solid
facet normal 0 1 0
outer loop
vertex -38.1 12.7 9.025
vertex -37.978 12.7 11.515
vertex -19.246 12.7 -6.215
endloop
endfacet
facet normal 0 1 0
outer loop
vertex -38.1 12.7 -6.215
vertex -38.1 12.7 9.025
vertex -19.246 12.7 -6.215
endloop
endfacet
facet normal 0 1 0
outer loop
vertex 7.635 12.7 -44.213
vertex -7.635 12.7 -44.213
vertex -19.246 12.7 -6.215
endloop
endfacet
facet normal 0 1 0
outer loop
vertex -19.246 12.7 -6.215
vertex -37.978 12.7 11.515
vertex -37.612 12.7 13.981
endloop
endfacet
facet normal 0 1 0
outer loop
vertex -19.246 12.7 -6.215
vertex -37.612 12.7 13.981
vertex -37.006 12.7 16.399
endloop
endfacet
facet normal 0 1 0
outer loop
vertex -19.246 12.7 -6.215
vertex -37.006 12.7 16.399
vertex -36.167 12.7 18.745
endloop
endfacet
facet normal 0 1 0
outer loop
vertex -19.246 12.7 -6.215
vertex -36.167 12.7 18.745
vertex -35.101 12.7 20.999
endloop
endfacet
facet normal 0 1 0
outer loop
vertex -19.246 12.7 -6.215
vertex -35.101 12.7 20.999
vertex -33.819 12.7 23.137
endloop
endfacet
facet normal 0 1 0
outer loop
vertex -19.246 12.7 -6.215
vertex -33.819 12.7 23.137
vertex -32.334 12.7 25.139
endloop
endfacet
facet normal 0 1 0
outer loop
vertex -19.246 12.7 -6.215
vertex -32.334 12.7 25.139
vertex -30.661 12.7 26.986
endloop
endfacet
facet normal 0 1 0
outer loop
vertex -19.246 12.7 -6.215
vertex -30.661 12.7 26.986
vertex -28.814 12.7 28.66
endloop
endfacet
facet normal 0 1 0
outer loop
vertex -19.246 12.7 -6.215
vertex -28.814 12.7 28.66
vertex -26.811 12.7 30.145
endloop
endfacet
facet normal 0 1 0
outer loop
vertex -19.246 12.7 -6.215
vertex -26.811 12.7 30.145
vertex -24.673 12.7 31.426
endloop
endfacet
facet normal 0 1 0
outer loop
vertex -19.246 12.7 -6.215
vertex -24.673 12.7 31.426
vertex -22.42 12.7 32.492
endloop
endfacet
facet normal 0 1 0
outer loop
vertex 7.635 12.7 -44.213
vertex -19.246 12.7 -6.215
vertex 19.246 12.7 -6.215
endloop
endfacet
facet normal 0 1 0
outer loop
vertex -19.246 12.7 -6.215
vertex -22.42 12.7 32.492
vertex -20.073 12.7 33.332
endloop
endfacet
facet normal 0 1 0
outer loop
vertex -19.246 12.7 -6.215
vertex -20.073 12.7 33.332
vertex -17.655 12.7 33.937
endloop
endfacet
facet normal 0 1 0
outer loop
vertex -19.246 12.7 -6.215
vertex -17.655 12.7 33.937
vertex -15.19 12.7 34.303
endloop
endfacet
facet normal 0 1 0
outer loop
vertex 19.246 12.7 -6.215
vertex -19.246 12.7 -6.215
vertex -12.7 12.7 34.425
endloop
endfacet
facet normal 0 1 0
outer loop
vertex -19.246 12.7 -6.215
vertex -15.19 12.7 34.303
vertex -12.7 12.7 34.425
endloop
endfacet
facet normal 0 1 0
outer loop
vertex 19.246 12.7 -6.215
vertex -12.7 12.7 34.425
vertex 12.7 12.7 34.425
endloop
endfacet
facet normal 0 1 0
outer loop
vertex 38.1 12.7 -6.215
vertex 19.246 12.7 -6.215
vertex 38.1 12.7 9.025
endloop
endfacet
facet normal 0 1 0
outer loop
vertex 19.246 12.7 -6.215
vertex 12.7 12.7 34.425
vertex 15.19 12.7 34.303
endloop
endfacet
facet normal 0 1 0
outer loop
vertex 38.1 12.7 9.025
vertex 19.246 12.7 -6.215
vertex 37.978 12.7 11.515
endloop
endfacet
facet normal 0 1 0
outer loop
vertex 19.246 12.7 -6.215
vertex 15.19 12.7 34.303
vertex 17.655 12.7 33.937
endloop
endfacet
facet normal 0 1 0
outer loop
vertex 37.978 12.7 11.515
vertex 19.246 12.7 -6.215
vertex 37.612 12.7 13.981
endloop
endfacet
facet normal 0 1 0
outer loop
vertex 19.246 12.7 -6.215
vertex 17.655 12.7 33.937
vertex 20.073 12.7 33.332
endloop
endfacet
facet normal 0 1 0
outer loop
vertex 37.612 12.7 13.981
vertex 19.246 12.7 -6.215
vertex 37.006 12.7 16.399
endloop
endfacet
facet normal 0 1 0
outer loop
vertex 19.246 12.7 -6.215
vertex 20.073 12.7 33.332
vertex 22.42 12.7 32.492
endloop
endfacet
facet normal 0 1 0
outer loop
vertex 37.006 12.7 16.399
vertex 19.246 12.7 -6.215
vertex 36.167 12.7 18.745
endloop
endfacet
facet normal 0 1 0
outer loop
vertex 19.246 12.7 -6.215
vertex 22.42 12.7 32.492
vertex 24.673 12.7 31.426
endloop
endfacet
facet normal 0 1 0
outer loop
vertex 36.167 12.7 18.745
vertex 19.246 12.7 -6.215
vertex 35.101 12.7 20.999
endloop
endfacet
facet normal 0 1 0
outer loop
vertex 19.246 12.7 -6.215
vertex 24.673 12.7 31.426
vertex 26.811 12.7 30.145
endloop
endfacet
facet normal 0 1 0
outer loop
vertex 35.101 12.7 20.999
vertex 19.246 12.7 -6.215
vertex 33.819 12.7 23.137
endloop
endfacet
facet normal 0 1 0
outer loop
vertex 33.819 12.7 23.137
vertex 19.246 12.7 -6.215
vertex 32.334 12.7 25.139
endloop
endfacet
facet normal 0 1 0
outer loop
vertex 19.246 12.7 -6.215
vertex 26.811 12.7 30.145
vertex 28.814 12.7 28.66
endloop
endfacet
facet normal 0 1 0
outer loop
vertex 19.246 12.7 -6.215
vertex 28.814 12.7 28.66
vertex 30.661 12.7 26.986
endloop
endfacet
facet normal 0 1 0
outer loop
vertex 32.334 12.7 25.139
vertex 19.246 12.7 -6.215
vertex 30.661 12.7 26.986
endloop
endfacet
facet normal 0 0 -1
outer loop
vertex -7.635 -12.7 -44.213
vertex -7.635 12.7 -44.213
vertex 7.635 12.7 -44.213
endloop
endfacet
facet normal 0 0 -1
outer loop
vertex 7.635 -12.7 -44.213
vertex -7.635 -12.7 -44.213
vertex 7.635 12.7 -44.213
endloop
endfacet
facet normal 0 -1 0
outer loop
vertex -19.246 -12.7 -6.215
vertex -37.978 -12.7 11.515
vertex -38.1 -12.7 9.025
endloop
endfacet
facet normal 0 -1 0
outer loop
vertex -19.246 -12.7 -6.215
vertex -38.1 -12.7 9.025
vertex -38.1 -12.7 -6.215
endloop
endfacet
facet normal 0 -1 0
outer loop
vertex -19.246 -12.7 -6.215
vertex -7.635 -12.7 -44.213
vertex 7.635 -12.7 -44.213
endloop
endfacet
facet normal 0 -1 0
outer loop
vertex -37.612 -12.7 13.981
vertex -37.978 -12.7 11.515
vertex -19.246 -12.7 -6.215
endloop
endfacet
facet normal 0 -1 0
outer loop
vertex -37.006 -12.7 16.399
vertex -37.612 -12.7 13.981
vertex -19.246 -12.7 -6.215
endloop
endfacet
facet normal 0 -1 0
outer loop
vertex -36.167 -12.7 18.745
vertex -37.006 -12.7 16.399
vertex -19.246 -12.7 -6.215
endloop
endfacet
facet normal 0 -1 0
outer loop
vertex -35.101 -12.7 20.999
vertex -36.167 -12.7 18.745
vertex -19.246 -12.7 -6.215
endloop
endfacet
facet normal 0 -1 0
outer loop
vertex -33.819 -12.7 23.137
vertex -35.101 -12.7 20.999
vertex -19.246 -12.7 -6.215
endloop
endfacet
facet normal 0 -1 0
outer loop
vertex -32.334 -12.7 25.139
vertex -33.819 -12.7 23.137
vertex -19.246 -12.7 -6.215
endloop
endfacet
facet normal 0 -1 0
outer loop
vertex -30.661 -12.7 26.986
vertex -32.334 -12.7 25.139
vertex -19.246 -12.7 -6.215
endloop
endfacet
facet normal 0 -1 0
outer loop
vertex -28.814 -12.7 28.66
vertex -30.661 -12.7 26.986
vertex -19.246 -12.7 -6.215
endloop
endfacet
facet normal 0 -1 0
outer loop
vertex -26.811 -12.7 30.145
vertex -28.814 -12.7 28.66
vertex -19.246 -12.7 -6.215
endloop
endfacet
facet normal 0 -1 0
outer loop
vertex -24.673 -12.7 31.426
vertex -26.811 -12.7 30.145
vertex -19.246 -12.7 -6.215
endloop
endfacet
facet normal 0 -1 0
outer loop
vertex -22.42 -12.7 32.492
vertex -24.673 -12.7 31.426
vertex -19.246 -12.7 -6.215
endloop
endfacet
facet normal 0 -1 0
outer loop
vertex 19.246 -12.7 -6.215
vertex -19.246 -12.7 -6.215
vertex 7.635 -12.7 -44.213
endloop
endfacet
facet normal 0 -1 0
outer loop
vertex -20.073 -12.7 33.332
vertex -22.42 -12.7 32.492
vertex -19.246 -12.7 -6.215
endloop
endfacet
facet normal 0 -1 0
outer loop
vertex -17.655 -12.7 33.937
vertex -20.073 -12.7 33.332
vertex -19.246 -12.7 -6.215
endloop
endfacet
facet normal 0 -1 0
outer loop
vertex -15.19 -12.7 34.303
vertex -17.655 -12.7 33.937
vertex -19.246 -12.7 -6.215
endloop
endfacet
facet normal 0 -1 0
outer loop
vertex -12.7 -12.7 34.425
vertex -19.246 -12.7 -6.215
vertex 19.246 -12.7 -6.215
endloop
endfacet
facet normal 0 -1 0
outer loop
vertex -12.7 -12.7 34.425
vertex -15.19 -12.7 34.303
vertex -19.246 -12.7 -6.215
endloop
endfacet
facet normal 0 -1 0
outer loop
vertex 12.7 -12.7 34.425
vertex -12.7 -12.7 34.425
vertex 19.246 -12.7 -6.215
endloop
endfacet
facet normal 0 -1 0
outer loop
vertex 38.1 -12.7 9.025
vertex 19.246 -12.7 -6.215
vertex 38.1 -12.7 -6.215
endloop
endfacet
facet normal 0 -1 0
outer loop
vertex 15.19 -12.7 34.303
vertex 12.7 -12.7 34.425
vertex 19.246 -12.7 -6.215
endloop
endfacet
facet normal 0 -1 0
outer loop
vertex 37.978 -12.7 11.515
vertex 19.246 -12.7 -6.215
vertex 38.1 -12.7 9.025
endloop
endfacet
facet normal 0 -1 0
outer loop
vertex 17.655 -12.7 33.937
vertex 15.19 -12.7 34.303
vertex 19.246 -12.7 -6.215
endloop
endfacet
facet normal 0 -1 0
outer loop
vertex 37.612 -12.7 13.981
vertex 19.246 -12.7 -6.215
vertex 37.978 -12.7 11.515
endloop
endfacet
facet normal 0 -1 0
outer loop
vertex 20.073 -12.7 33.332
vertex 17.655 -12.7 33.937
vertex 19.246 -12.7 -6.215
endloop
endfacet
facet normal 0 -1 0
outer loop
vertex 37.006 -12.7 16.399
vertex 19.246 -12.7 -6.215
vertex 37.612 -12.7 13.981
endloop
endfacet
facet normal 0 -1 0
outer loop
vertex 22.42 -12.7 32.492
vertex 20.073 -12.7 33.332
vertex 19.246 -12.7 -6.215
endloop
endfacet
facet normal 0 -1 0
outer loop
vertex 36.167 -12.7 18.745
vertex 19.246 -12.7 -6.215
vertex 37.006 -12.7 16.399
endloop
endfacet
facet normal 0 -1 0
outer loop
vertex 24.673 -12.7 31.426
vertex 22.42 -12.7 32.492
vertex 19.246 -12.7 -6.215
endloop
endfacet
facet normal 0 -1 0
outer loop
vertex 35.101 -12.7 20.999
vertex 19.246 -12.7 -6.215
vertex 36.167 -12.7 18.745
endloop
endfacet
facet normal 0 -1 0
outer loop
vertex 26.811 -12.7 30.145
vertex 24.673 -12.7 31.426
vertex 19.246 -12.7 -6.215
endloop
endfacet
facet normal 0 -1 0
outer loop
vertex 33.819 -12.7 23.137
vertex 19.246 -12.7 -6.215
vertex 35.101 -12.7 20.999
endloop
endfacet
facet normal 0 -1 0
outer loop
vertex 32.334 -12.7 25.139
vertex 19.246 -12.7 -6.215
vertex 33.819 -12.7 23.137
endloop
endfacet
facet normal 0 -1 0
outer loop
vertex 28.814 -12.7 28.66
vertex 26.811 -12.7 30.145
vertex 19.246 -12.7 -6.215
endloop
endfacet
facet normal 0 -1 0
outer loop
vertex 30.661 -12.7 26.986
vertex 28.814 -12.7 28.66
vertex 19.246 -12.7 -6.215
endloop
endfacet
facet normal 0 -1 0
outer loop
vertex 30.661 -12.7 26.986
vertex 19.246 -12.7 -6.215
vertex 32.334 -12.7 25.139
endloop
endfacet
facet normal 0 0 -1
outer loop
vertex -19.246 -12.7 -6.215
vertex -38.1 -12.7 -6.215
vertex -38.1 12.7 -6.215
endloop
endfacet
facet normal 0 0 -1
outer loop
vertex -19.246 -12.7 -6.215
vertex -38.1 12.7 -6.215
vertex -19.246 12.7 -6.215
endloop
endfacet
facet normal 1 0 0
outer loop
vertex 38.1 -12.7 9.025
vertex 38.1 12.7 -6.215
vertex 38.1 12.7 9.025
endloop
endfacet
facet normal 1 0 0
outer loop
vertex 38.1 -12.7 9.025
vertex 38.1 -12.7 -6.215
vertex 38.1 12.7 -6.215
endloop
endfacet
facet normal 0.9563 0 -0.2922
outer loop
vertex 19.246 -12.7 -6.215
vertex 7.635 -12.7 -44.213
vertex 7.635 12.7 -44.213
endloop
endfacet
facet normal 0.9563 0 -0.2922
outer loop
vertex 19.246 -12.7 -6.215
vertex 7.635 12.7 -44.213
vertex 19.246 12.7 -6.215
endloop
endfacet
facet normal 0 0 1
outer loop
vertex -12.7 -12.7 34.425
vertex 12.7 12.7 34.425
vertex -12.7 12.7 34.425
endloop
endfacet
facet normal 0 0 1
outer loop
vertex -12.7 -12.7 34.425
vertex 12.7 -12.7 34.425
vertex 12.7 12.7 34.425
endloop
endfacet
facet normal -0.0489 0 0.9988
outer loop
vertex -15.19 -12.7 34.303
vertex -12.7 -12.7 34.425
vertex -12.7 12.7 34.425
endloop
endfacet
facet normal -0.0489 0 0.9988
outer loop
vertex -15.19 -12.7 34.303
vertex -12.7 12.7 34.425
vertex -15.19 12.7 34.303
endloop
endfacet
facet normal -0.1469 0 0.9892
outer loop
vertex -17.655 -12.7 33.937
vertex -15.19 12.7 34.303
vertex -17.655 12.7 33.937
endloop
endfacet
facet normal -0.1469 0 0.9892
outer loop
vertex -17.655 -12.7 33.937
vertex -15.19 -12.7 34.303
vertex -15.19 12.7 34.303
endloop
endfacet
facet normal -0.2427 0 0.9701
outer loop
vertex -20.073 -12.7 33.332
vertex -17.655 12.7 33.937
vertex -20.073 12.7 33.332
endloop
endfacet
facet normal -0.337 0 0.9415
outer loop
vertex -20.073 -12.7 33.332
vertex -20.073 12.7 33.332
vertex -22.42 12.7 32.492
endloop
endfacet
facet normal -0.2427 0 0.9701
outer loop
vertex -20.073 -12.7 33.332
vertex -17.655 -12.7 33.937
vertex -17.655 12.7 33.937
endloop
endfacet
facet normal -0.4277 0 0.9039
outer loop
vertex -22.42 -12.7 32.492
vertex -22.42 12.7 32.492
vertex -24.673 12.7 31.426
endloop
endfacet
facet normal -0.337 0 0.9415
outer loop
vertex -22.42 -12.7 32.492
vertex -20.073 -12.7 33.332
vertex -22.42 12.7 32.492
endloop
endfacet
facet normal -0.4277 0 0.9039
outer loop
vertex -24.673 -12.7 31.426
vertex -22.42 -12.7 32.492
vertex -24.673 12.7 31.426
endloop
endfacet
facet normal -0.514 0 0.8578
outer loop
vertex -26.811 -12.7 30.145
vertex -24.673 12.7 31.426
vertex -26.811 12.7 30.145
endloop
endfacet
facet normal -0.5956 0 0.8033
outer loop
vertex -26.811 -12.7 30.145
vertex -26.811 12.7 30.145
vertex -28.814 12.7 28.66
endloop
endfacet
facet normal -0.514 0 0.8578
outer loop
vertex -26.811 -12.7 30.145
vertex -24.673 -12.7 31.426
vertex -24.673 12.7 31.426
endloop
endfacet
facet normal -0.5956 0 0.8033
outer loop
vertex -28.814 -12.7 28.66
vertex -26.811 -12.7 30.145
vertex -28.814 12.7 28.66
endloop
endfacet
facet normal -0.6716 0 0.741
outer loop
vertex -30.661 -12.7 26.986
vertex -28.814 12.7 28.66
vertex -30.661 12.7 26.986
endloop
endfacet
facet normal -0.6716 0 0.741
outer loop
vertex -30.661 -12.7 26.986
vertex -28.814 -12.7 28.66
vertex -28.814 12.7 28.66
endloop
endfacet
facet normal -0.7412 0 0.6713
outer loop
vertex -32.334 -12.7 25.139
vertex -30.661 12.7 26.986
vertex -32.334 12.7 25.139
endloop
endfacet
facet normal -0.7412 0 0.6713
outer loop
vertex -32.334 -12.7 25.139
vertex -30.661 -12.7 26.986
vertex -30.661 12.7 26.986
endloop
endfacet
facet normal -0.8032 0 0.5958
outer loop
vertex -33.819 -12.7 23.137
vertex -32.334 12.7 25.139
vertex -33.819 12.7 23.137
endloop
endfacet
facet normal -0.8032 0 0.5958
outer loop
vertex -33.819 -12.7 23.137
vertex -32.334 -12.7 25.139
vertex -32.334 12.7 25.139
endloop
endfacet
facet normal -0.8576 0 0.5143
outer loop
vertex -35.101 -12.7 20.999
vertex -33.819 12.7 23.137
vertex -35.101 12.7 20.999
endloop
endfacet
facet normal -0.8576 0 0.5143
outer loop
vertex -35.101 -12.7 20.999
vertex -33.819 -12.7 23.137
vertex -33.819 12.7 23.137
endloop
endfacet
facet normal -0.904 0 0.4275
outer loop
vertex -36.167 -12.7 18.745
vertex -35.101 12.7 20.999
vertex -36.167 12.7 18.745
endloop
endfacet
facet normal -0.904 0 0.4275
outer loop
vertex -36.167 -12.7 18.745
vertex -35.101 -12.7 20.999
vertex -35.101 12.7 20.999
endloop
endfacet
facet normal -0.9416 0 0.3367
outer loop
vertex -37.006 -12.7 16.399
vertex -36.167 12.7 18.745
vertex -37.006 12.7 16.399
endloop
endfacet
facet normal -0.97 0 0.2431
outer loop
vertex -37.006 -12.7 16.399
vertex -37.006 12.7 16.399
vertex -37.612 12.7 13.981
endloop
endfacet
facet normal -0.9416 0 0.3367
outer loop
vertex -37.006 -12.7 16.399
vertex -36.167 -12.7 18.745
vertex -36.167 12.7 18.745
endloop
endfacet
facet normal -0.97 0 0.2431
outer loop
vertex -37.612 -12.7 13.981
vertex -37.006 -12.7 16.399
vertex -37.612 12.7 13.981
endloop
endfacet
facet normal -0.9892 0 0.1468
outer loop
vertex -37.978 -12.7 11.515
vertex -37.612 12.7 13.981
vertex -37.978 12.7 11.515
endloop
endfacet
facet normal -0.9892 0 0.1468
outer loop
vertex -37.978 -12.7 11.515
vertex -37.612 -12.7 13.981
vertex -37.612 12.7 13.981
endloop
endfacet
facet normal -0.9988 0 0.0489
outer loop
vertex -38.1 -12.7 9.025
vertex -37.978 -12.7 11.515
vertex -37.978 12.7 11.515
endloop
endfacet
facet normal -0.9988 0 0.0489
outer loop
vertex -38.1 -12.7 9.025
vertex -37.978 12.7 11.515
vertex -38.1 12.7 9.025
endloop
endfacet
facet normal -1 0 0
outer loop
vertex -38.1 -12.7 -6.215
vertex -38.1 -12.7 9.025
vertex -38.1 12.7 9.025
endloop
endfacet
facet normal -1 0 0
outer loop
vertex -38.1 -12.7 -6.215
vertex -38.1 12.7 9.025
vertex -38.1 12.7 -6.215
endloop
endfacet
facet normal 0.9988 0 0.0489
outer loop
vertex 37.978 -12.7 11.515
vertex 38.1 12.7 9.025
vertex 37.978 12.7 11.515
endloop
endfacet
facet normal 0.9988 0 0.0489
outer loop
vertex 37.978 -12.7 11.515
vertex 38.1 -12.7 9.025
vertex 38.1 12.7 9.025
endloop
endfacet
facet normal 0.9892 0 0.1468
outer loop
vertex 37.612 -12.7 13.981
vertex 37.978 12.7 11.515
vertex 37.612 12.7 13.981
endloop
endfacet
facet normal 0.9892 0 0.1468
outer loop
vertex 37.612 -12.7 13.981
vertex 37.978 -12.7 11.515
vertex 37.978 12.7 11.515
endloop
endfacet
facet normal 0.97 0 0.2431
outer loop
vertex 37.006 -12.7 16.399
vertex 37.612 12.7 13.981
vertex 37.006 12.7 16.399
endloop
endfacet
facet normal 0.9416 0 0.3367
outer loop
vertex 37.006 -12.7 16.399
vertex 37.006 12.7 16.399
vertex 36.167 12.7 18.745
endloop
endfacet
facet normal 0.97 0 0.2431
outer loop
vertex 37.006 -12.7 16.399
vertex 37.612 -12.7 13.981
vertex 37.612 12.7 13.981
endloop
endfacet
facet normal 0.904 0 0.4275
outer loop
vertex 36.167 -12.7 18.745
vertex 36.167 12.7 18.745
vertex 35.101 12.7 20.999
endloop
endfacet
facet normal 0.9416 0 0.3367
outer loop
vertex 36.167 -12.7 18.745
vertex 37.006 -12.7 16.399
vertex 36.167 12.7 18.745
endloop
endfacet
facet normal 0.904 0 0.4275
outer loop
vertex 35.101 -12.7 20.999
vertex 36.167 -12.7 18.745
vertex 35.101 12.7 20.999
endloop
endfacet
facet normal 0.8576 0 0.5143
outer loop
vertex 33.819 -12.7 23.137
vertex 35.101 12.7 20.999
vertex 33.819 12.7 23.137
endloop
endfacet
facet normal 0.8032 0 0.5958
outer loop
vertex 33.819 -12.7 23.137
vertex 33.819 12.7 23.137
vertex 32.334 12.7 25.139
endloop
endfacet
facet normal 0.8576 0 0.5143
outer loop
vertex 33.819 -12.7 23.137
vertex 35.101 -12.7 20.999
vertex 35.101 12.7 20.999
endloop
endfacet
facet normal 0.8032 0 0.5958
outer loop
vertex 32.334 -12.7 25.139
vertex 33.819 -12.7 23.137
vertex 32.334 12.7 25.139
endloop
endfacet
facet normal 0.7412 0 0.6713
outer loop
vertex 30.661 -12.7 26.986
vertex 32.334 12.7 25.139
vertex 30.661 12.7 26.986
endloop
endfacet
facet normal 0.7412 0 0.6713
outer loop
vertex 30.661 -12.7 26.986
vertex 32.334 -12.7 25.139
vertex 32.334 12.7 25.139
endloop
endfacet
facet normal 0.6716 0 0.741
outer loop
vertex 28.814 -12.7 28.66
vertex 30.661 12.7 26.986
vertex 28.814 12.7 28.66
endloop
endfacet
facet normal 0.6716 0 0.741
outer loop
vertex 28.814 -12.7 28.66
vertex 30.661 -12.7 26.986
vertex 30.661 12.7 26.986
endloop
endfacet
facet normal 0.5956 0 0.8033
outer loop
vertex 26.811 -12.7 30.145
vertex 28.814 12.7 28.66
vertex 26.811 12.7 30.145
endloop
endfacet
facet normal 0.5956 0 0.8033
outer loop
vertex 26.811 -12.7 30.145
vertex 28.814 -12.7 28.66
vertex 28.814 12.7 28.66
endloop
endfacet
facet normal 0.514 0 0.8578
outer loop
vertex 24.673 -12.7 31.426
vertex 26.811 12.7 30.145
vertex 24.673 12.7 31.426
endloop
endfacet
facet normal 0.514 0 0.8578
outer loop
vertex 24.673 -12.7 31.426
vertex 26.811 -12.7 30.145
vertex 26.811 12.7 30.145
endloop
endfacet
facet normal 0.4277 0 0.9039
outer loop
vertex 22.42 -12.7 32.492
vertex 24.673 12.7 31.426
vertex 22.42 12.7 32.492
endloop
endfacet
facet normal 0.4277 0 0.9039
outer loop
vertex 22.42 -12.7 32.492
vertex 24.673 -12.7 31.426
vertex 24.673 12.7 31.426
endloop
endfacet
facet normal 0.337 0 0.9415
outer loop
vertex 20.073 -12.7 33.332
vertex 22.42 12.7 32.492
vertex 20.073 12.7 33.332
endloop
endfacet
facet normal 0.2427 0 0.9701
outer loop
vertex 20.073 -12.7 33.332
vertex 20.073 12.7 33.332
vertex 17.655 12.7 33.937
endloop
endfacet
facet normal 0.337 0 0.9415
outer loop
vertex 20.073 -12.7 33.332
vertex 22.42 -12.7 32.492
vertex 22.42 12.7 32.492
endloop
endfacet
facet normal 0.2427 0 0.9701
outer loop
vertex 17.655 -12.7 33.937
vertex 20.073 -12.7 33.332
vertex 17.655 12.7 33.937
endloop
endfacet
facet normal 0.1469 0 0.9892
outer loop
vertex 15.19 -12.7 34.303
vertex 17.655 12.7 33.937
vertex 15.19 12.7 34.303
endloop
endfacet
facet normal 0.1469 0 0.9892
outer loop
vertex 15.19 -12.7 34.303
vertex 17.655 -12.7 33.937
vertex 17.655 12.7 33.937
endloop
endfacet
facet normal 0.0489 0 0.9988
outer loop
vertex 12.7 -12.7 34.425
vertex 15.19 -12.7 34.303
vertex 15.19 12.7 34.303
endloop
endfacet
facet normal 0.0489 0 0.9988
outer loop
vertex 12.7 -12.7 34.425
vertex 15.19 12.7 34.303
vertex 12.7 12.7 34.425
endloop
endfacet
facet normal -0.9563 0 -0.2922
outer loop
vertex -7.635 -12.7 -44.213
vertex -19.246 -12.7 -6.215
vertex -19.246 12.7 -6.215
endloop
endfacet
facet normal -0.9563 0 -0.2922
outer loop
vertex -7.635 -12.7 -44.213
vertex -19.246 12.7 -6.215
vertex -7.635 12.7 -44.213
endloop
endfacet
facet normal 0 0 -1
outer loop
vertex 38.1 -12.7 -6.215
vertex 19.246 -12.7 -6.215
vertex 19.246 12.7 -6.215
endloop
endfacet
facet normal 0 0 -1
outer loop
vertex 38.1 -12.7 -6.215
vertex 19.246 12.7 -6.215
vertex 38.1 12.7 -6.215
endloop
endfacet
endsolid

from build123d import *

# Parameters (mm, degrees)
F1_DEPTH      = 12.7
F1_DEPTH_BACK = 12.7


with BuildPart() as f1:
    # F0 (on Front) → F1 (new body, two sides)
    with BuildSketch(Plane.XZ) as f1_sk:
        with BuildLine():
            Line((12.7, 34.4253193842), (0, 34.4253193842))
            Line((0, 34.4253193842), (0, -5.8595561422))
            Line((0, -5.8595561422), (0, -6.2146806158))
            Line((0, -6.2146806158), (19.245794032, -6.2146806158))
            Line((19.245794032, -6.2146806158), (38.1, -6.2146806158))
            Line((38.1, -6.2146806158), (38.1, 9.0253193842))
            ThreePointArc((38.1, 9.0253193842), (30.6605122421, 26.9858316263), (12.7, 34.4253193842))
        make_face()
        with BuildLine():
            Line((0, -5.8595561422), (0, 34.4253193842))
            Line((0, 34.4253193842), (-12.7, 34.4253193842))
            ThreePointArc((-12.7, 34.4253193842), (-30.6605122421, 26.9858316263), (-38.1, 9.0253193842))
            Line((-38.1, 9.0253193842), (-38.1, -6.2146806158))
            Line((-38.1, -6.2146806158), (-19.245794032, -6.2146806158))
            Line((-19.245794032, -6.2146806158), (0, -5.8595561422))
        make_face()
        Polygon((0, -6.2146806158), (0, -5.8595561422), (-19.245794032, -6.2146806158), align=None)
        Polygon((19.245794032, -6.2146806158), (0, -6.2146806158), (-19.245794032, -6.2146806158), (-7.6351859607, -44.2130304873), (7.6351859607, -44.2130304873), align=None)
    extrude(amount=F1_DEPTH)
    extrude(f1_sk.sketch, amount=-F1_DEPTH_BACK)


solid = f1.part
